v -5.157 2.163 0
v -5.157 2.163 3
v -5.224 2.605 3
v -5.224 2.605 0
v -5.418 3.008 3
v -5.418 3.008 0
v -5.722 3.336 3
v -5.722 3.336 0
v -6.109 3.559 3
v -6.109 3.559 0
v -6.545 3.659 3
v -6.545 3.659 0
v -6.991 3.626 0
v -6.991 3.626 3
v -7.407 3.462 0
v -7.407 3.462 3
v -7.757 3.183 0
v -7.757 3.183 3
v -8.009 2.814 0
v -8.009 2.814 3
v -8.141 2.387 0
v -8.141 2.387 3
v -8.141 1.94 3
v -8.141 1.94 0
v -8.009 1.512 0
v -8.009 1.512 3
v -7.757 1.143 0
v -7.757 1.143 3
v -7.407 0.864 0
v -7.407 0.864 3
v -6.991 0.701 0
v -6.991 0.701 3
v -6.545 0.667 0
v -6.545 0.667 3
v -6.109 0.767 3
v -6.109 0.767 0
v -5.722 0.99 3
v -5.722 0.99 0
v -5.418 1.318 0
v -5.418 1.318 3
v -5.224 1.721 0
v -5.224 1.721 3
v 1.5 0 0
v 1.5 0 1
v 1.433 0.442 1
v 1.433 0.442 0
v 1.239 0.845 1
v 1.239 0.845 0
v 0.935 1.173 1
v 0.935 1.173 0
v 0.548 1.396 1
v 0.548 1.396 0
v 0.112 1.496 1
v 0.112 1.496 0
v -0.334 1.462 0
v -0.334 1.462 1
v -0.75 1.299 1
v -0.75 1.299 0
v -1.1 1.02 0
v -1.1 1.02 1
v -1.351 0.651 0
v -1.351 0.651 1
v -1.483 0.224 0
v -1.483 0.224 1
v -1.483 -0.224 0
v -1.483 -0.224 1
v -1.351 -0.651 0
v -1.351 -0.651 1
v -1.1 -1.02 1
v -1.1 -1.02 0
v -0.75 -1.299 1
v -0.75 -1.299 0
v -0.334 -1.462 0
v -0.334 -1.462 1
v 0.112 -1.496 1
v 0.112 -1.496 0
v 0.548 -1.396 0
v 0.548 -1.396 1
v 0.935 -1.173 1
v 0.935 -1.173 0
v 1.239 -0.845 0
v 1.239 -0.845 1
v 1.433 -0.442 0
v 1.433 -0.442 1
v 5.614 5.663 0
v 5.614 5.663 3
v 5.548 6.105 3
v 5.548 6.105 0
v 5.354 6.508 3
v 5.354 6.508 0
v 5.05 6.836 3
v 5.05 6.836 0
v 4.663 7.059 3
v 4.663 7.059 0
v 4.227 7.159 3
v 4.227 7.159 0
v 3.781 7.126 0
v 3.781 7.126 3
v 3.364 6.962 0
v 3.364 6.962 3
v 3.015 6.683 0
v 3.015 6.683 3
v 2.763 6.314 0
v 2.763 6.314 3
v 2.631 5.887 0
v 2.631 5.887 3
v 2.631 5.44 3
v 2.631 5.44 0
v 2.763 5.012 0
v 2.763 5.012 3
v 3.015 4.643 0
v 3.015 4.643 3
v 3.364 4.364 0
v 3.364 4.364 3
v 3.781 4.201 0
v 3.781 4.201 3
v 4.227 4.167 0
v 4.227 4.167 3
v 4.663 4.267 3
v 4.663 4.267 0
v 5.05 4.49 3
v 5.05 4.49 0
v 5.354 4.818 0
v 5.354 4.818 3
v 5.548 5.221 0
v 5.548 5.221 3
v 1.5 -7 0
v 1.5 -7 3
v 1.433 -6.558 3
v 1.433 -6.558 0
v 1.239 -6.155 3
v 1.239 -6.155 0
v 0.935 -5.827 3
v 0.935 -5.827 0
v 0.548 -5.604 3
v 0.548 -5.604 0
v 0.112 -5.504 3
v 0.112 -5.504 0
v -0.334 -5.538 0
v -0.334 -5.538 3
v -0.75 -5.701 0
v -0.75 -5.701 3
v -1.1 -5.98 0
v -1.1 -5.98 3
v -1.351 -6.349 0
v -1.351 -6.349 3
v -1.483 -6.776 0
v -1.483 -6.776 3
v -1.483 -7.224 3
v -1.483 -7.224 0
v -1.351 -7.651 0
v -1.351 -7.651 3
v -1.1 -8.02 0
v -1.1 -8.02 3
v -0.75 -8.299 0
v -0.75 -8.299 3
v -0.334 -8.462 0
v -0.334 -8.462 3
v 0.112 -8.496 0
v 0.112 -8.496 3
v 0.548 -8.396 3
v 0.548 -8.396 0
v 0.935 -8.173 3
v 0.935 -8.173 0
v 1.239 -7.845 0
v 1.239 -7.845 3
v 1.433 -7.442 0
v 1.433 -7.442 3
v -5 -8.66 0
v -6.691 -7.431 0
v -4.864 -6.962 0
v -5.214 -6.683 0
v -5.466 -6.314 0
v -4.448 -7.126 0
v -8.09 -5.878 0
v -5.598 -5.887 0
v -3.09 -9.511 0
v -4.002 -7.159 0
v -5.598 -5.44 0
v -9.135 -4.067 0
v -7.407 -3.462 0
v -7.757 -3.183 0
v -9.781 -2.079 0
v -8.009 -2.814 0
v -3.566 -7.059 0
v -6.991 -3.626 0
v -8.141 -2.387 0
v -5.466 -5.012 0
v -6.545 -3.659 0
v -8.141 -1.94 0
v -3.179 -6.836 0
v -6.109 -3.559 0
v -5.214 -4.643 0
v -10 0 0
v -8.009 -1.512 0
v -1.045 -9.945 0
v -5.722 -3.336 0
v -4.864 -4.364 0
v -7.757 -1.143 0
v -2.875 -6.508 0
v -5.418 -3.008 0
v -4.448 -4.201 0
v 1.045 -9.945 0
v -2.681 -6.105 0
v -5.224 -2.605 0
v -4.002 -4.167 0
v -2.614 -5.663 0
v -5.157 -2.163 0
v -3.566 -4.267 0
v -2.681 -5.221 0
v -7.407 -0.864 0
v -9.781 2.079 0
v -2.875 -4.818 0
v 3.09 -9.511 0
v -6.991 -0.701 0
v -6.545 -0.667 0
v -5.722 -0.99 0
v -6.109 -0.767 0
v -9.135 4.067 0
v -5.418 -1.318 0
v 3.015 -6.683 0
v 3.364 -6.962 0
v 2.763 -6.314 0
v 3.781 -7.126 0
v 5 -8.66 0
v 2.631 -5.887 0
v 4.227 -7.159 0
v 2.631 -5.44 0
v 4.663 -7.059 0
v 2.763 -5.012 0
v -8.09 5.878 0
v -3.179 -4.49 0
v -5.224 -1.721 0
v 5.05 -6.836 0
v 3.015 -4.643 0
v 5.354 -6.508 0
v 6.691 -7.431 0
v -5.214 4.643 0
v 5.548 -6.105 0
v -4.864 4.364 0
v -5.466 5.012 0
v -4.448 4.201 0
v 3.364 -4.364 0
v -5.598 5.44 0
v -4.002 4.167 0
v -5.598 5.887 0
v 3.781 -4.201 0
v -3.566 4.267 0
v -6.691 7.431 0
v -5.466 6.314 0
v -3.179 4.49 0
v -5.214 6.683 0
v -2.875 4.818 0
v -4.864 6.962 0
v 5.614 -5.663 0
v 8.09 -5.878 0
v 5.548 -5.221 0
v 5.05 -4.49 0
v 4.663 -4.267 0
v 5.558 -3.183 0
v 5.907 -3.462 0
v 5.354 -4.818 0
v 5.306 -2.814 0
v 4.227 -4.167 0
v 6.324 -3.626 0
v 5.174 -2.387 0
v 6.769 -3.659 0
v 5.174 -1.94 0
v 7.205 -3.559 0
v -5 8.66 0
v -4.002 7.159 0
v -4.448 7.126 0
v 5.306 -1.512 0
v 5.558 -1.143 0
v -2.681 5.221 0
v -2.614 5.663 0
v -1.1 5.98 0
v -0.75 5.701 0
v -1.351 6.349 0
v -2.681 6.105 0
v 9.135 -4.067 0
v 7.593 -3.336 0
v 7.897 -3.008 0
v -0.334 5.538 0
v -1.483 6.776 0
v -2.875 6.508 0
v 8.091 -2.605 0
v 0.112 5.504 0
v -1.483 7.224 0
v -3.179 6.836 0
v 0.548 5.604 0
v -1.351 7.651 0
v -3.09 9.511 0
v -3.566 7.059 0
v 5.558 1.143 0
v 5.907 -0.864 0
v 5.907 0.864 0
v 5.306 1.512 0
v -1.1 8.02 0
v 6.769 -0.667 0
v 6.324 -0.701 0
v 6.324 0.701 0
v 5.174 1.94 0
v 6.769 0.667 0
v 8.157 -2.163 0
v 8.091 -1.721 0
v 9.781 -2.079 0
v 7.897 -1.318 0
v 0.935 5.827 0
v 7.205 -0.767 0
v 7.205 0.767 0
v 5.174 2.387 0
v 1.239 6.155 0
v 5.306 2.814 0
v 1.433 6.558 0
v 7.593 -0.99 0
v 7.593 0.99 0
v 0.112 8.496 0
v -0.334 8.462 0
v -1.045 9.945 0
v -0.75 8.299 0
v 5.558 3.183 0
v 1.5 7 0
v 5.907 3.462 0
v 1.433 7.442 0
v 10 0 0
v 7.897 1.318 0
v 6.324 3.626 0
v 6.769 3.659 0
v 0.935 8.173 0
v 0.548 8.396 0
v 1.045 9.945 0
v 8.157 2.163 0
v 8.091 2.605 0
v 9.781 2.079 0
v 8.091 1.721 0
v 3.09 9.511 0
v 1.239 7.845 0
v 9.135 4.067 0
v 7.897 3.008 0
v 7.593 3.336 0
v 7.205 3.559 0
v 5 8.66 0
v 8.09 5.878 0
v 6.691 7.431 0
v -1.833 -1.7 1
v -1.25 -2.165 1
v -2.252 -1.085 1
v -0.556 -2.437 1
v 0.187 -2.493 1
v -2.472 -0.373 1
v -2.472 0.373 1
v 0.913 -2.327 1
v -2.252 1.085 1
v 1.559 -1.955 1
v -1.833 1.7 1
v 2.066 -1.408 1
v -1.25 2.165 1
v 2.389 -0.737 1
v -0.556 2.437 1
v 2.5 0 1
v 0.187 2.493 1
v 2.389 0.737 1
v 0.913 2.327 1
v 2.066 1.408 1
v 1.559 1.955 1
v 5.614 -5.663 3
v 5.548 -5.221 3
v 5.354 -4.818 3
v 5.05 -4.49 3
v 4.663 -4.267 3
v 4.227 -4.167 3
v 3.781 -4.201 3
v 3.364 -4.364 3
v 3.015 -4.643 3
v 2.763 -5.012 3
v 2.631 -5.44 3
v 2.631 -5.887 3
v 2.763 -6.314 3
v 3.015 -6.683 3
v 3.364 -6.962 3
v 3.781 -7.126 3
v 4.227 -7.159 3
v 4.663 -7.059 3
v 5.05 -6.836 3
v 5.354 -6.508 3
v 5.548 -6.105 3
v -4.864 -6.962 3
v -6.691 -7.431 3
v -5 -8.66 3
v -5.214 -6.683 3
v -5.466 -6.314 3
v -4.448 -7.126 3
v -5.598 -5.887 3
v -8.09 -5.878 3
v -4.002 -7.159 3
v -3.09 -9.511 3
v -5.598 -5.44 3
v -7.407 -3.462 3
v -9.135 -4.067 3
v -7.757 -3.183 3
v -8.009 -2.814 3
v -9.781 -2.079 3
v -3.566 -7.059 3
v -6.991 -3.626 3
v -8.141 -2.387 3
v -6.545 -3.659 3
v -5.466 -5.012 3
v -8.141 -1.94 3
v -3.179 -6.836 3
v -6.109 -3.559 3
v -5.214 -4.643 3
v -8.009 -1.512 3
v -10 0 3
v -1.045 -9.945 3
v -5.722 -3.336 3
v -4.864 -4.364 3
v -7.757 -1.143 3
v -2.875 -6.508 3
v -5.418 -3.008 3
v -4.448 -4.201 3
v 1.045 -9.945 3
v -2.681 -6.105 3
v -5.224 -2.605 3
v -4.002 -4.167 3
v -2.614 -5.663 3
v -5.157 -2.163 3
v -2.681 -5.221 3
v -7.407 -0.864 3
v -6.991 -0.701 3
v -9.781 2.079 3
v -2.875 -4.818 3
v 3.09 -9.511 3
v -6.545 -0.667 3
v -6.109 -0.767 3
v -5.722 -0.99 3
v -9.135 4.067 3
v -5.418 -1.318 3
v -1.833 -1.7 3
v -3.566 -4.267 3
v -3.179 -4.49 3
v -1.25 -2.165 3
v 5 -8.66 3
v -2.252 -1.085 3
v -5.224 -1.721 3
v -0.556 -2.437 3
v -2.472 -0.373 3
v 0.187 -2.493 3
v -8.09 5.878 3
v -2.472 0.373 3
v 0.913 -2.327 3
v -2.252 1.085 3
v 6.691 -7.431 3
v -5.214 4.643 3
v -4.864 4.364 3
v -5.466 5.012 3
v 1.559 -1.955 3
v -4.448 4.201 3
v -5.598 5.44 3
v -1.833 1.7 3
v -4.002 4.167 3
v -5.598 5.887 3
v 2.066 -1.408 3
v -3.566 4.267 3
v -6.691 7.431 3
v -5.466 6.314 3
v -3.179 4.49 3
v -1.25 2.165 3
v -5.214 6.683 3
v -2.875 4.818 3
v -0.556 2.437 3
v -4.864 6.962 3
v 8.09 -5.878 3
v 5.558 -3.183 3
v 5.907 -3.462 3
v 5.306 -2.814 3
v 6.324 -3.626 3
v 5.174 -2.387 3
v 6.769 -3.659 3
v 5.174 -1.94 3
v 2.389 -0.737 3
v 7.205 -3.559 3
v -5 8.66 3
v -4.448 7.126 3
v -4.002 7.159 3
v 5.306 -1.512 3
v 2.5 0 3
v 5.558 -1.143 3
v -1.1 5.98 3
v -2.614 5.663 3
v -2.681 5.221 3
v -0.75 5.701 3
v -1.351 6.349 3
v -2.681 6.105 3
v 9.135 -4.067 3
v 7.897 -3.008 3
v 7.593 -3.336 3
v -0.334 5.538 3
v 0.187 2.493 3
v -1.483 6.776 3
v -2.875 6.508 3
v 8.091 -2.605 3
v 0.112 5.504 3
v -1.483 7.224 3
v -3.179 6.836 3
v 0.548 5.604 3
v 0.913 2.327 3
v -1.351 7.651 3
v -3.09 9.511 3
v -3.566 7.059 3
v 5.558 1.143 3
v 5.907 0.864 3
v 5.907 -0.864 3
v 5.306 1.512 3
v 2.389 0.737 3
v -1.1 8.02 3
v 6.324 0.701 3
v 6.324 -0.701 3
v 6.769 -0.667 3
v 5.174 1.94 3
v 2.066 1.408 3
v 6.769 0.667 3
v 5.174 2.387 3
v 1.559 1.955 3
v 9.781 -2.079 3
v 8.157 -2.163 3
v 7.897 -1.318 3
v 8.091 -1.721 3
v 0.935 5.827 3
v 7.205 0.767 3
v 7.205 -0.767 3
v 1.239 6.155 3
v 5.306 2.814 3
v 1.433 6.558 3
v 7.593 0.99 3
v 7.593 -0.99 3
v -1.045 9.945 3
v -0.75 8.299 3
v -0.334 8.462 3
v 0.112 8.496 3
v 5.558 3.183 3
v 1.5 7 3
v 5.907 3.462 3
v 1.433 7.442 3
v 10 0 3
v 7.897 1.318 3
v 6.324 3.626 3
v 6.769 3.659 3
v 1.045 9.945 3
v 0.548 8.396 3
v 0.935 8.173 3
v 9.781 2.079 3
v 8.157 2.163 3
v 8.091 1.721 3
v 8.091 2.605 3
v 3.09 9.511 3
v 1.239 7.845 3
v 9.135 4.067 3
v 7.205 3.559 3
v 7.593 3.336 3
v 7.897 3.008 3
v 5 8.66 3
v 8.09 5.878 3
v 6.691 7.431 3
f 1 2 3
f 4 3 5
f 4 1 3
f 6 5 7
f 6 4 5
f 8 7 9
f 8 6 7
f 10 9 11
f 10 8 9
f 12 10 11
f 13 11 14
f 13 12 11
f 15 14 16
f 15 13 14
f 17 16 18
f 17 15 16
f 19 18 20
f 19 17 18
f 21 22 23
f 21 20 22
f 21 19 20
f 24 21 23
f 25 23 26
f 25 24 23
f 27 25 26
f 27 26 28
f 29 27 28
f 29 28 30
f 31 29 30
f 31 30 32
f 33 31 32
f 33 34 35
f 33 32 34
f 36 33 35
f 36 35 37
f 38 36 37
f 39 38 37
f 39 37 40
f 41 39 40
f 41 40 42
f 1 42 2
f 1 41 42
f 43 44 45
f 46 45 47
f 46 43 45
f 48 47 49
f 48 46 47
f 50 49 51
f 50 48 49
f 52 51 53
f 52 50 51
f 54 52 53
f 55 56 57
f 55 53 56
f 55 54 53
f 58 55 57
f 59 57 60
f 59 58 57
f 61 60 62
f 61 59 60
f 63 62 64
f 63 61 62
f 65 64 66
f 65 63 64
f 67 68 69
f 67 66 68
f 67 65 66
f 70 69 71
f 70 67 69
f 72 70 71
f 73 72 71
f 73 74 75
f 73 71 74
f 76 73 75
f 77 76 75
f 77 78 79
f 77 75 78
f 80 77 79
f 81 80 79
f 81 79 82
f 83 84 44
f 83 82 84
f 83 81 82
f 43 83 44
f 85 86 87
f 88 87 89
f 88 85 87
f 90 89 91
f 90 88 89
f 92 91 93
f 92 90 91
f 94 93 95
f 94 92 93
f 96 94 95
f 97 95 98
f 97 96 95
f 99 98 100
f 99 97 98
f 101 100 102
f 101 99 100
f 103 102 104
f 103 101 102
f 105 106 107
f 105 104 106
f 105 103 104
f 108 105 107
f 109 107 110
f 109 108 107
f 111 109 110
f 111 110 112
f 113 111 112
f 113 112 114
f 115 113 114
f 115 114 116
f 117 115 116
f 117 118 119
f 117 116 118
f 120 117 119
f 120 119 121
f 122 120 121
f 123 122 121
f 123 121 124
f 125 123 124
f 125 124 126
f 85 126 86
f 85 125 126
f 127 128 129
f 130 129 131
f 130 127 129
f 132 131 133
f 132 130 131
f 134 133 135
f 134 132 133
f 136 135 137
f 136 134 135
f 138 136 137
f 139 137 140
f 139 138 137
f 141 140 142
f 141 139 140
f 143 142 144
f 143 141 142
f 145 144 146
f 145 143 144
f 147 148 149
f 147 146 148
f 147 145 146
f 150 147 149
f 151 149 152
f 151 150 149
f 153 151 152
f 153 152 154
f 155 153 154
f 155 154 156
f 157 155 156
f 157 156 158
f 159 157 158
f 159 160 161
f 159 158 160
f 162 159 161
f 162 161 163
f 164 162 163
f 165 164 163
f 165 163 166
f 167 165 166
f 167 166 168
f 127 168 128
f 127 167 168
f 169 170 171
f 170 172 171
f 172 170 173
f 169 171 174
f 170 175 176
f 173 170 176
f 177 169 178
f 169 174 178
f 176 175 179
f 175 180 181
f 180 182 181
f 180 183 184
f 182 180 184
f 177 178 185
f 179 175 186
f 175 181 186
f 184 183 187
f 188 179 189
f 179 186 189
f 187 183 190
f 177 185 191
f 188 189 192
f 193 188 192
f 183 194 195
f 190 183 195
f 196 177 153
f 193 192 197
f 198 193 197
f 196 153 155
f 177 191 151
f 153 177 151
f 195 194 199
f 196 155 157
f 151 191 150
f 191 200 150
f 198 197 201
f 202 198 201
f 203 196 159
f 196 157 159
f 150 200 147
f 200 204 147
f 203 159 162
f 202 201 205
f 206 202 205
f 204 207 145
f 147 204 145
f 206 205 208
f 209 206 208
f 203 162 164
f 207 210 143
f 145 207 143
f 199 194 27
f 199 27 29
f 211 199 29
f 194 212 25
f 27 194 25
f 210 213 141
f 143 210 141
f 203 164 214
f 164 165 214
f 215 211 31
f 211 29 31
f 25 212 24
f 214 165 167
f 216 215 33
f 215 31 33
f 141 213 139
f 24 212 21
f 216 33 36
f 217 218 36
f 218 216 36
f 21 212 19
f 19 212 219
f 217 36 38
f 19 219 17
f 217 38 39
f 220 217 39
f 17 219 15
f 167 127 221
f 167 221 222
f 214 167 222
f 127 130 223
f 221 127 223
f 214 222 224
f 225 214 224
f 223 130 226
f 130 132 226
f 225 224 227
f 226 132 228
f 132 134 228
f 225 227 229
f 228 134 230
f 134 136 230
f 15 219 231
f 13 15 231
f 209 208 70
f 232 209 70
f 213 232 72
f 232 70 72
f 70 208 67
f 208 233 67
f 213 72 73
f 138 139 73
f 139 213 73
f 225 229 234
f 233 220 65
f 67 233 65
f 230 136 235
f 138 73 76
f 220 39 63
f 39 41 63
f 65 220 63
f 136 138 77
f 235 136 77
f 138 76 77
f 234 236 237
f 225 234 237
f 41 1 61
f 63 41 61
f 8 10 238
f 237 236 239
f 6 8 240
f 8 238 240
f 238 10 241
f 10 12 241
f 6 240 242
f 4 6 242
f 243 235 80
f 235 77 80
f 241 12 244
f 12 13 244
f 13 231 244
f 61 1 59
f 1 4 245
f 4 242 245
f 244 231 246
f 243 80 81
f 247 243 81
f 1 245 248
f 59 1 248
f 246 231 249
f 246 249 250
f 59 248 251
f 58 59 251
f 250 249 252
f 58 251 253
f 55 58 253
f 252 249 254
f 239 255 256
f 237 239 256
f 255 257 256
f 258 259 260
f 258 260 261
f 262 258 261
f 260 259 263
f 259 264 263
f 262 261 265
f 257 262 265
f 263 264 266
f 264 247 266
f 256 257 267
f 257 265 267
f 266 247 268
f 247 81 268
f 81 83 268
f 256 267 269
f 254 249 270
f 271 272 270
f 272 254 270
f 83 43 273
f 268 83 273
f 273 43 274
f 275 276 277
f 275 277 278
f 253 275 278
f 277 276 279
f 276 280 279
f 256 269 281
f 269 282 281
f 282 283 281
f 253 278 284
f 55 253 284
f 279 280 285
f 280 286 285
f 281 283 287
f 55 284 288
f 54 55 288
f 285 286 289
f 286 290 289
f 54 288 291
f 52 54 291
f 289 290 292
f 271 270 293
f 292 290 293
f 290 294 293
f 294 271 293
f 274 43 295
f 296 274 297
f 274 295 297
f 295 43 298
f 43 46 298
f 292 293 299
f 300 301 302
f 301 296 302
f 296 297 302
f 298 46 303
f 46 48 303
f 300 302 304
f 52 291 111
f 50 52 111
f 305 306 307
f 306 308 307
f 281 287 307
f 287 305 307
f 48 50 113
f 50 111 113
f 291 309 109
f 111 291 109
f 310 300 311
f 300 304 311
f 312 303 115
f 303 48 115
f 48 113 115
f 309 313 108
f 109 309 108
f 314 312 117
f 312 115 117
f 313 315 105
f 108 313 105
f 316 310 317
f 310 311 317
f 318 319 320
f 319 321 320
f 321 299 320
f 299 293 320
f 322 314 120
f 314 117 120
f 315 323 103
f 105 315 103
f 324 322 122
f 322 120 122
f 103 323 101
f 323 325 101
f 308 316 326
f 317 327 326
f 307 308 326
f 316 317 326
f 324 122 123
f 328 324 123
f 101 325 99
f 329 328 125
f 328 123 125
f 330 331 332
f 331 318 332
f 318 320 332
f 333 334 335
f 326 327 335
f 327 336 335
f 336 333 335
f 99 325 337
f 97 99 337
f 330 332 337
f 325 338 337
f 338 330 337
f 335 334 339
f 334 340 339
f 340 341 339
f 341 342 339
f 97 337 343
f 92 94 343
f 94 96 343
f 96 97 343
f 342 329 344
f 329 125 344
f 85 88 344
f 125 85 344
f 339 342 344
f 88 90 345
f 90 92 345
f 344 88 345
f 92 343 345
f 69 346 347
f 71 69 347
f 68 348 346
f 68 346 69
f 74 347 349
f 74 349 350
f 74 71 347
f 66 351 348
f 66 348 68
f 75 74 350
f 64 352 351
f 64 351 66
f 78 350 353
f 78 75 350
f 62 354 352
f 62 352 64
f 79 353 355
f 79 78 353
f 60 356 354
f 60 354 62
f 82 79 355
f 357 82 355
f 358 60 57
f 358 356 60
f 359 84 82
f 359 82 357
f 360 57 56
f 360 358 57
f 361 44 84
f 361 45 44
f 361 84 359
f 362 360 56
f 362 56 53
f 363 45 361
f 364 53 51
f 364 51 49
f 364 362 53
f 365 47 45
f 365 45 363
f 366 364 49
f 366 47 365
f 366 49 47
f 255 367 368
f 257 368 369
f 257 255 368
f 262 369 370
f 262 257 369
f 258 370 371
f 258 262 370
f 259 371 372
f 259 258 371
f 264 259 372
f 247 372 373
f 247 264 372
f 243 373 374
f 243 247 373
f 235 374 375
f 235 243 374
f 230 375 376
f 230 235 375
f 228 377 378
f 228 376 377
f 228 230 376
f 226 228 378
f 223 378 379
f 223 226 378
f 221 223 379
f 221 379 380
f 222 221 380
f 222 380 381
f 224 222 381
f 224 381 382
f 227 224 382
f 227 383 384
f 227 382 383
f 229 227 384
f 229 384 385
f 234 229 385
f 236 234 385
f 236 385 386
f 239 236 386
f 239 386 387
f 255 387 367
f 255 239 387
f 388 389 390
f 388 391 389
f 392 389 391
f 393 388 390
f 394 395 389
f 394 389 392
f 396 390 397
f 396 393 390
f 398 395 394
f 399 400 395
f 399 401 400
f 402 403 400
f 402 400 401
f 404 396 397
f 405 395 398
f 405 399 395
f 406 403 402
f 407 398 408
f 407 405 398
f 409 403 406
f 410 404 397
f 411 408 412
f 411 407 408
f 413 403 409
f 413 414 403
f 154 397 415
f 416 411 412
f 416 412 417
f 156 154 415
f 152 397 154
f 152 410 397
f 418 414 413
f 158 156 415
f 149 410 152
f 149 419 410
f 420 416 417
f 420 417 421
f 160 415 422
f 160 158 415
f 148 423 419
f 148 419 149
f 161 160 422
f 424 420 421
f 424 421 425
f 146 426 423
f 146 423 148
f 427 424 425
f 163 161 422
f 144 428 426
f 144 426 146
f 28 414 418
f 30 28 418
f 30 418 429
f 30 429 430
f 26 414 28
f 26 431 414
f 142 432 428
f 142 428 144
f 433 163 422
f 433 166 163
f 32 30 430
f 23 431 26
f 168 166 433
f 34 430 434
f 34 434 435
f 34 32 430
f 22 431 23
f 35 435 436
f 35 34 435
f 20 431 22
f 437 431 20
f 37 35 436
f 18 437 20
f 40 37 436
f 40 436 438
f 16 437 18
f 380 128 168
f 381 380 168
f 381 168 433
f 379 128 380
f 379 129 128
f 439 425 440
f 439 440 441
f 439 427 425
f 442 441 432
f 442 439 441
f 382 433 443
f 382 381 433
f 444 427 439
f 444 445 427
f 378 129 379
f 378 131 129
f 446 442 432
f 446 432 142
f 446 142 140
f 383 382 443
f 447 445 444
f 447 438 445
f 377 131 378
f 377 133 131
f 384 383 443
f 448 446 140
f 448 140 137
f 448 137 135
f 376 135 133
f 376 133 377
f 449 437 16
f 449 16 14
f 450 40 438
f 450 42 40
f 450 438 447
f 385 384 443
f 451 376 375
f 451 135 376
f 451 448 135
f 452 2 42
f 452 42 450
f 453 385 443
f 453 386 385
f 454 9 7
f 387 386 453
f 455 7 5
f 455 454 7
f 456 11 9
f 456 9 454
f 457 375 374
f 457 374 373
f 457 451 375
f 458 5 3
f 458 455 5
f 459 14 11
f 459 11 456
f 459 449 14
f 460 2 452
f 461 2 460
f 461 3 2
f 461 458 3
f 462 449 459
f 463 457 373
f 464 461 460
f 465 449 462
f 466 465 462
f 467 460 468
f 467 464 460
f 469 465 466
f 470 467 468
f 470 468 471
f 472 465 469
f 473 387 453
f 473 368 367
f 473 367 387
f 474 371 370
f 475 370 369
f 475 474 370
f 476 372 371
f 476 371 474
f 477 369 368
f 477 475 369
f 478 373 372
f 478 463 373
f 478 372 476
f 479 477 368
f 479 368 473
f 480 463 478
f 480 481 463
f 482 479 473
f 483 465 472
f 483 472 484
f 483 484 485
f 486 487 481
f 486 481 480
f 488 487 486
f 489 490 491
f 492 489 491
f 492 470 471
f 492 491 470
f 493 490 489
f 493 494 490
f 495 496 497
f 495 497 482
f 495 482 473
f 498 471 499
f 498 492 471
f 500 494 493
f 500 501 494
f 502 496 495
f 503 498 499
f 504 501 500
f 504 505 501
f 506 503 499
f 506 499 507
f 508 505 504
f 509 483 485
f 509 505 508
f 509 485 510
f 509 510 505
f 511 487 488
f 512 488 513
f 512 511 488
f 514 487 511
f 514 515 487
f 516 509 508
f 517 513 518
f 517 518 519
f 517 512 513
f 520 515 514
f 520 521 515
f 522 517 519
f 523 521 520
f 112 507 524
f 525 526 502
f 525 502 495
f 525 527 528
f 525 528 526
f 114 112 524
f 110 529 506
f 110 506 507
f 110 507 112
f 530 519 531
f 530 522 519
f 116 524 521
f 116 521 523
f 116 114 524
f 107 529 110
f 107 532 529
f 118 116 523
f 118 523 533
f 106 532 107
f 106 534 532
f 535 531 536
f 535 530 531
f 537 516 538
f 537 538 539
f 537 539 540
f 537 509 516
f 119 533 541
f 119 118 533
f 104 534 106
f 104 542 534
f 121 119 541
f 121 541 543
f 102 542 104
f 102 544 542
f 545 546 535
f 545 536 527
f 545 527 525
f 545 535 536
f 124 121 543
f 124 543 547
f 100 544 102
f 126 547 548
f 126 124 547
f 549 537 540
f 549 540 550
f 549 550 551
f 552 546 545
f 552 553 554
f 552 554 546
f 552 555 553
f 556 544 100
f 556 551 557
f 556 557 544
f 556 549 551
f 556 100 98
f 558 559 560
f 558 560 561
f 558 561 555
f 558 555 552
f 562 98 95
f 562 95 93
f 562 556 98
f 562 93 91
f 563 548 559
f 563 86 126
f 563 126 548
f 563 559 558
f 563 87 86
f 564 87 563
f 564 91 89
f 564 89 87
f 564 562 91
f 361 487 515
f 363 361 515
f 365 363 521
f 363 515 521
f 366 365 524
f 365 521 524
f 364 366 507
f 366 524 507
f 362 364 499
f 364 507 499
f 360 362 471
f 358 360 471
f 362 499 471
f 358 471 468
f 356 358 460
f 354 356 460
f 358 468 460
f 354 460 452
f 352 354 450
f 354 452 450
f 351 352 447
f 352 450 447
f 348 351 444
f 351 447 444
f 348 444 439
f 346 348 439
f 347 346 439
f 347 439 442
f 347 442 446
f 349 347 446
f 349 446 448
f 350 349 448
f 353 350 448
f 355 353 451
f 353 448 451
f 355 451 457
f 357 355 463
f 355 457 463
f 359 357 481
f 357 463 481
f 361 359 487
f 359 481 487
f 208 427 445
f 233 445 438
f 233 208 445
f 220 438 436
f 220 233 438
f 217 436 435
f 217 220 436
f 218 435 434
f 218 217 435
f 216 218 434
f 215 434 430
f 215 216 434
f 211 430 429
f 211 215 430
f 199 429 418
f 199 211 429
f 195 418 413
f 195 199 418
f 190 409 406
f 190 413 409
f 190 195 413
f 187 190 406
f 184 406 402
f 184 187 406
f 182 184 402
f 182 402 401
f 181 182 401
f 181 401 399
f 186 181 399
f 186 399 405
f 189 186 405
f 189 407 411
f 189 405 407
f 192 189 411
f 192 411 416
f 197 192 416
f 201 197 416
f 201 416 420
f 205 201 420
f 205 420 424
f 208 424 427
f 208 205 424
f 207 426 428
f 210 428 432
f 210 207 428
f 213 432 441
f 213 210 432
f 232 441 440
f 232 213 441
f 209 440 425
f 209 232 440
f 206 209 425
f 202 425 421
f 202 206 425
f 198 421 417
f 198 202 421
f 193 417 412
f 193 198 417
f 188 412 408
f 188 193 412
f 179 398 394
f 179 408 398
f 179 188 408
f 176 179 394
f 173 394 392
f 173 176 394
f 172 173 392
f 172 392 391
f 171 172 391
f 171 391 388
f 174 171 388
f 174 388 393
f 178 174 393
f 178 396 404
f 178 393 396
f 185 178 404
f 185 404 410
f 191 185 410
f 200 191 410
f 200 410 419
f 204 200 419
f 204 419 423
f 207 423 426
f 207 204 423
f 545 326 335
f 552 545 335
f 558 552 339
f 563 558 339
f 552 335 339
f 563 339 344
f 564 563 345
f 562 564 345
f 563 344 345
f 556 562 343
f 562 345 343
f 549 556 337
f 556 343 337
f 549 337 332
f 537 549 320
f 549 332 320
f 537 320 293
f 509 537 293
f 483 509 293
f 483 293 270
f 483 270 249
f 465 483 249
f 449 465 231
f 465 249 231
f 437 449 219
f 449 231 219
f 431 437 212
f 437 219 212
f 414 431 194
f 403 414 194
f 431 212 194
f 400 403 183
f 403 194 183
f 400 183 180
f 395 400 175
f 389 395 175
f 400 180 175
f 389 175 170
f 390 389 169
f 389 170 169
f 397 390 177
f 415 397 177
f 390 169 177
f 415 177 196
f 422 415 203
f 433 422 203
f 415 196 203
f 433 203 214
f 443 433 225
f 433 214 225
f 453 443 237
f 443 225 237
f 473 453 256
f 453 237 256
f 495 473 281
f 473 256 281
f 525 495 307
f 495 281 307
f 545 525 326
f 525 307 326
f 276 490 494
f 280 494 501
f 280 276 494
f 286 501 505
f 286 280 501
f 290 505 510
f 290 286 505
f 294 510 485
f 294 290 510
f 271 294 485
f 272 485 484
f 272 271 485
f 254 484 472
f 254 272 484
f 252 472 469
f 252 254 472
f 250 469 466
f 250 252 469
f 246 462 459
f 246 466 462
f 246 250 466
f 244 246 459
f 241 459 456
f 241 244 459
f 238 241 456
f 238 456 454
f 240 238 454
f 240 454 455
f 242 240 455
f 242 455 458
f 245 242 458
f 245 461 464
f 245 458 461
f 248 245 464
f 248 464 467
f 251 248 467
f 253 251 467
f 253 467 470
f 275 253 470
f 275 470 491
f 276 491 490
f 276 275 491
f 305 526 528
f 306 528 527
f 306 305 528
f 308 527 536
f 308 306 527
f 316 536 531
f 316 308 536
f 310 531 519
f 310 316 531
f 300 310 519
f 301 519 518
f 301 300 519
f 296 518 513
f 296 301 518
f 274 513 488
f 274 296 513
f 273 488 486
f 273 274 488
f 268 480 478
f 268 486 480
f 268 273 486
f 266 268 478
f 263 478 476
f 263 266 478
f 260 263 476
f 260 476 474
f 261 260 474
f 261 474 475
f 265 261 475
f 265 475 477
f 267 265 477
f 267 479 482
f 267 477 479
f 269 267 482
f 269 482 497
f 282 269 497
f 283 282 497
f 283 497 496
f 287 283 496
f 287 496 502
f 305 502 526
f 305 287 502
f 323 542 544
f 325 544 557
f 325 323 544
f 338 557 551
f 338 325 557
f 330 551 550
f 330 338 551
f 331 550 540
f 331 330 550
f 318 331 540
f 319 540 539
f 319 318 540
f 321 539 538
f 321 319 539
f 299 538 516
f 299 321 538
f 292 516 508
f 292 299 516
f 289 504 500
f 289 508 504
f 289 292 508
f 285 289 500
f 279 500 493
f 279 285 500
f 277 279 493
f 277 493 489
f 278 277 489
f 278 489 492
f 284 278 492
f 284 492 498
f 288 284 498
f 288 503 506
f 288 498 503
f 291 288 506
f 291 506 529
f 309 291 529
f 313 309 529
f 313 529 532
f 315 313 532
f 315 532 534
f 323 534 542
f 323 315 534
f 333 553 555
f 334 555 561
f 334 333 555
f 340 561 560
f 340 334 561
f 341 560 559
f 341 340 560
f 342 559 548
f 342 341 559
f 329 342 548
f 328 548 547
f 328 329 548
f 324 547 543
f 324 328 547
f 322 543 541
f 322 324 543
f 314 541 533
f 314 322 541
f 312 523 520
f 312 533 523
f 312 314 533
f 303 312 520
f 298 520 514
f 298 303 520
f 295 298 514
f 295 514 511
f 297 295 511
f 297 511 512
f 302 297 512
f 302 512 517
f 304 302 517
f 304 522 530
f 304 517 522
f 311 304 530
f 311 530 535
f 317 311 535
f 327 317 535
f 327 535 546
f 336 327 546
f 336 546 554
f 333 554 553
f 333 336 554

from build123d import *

# Parameters (mm, degrees)
SKETCH1_R           = 10
BOSS_EXTRUDE1_DEPTH = 3
SKETCH1_6_R         = 1.5
CUT_EXTRUDE2_DEPTH  = 4
SKETCH1_7_R         = 1.5
CUT_EXTRUDE3_DEPTH  = 4
SKETCH3_R           = 2.5
CUT_EXTRUDE5_DEPTH  = 2


with BuildPart() as part:
    # Sketch1 → Boss-Extrude1 (new body)
    with BuildSketch(Plane.XY):
        Circle(SKETCH1_R)
    extrude(amount=BOSS_EXTRUDE1_DEPTH)

    # Sketch1<6> → Cut-Extrude2 (cut, through all)
    with BuildSketch(Plane.XY):
        Circle(SKETCH1_6_R)
    extrude(amount=CUT_EXTRUDE2_DEPTH, mode=Mode.SUBTRACT)

    # Sketch1<7> → Cut-Extrude3 (cut, through all)
    with BuildSketch(Plane.XY):
        with Locations((0, -7)):
            Circle(SKETCH1_7_R)
        with Locations((-4.114496766, -5.663118961)):
            Circle(SKETCH1_7_R)
        with Locations((-6.657395614, -2.163118961)):
            Circle(SKETCH1_7_R)
        with Locations((-6.657395614, 2.163118961)):
            Circle(SKETCH1_7_R)
        with Locations((-4.114496766, 5.663118961)):
            Circle(SKETCH1_7_R)
        with Locations((0, 7)):
            Circle(SKETCH1_7_R)
        with Locations((4.114496766, 5.663118961)):
            Circle(SKETCH1_7_R)
        with Locations((6.657395614, 2.163118961)):
            Circle(SKETCH1_7_R)
        with Locations((6.657395614, -2.163118961)):
            Circle(SKETCH1_7_R)
        with Locations((4.114496766, -5.663118961)):
            Circle(SKETCH1_7_R)
    extrude(amount=CUT_EXTRUDE3_DEPTH, mode=Mode.SUBTRACT)

    # Sketch3 → Cut-Extrude5 (cut)
    with BuildSketch(Plane.XY.offset(3)):
        Circle(SKETCH3_R)
    extrude(amount=-CUT_EXTRUDE5_DEPTH, mode=Mode.SUBTRACT)


solid = part.part
